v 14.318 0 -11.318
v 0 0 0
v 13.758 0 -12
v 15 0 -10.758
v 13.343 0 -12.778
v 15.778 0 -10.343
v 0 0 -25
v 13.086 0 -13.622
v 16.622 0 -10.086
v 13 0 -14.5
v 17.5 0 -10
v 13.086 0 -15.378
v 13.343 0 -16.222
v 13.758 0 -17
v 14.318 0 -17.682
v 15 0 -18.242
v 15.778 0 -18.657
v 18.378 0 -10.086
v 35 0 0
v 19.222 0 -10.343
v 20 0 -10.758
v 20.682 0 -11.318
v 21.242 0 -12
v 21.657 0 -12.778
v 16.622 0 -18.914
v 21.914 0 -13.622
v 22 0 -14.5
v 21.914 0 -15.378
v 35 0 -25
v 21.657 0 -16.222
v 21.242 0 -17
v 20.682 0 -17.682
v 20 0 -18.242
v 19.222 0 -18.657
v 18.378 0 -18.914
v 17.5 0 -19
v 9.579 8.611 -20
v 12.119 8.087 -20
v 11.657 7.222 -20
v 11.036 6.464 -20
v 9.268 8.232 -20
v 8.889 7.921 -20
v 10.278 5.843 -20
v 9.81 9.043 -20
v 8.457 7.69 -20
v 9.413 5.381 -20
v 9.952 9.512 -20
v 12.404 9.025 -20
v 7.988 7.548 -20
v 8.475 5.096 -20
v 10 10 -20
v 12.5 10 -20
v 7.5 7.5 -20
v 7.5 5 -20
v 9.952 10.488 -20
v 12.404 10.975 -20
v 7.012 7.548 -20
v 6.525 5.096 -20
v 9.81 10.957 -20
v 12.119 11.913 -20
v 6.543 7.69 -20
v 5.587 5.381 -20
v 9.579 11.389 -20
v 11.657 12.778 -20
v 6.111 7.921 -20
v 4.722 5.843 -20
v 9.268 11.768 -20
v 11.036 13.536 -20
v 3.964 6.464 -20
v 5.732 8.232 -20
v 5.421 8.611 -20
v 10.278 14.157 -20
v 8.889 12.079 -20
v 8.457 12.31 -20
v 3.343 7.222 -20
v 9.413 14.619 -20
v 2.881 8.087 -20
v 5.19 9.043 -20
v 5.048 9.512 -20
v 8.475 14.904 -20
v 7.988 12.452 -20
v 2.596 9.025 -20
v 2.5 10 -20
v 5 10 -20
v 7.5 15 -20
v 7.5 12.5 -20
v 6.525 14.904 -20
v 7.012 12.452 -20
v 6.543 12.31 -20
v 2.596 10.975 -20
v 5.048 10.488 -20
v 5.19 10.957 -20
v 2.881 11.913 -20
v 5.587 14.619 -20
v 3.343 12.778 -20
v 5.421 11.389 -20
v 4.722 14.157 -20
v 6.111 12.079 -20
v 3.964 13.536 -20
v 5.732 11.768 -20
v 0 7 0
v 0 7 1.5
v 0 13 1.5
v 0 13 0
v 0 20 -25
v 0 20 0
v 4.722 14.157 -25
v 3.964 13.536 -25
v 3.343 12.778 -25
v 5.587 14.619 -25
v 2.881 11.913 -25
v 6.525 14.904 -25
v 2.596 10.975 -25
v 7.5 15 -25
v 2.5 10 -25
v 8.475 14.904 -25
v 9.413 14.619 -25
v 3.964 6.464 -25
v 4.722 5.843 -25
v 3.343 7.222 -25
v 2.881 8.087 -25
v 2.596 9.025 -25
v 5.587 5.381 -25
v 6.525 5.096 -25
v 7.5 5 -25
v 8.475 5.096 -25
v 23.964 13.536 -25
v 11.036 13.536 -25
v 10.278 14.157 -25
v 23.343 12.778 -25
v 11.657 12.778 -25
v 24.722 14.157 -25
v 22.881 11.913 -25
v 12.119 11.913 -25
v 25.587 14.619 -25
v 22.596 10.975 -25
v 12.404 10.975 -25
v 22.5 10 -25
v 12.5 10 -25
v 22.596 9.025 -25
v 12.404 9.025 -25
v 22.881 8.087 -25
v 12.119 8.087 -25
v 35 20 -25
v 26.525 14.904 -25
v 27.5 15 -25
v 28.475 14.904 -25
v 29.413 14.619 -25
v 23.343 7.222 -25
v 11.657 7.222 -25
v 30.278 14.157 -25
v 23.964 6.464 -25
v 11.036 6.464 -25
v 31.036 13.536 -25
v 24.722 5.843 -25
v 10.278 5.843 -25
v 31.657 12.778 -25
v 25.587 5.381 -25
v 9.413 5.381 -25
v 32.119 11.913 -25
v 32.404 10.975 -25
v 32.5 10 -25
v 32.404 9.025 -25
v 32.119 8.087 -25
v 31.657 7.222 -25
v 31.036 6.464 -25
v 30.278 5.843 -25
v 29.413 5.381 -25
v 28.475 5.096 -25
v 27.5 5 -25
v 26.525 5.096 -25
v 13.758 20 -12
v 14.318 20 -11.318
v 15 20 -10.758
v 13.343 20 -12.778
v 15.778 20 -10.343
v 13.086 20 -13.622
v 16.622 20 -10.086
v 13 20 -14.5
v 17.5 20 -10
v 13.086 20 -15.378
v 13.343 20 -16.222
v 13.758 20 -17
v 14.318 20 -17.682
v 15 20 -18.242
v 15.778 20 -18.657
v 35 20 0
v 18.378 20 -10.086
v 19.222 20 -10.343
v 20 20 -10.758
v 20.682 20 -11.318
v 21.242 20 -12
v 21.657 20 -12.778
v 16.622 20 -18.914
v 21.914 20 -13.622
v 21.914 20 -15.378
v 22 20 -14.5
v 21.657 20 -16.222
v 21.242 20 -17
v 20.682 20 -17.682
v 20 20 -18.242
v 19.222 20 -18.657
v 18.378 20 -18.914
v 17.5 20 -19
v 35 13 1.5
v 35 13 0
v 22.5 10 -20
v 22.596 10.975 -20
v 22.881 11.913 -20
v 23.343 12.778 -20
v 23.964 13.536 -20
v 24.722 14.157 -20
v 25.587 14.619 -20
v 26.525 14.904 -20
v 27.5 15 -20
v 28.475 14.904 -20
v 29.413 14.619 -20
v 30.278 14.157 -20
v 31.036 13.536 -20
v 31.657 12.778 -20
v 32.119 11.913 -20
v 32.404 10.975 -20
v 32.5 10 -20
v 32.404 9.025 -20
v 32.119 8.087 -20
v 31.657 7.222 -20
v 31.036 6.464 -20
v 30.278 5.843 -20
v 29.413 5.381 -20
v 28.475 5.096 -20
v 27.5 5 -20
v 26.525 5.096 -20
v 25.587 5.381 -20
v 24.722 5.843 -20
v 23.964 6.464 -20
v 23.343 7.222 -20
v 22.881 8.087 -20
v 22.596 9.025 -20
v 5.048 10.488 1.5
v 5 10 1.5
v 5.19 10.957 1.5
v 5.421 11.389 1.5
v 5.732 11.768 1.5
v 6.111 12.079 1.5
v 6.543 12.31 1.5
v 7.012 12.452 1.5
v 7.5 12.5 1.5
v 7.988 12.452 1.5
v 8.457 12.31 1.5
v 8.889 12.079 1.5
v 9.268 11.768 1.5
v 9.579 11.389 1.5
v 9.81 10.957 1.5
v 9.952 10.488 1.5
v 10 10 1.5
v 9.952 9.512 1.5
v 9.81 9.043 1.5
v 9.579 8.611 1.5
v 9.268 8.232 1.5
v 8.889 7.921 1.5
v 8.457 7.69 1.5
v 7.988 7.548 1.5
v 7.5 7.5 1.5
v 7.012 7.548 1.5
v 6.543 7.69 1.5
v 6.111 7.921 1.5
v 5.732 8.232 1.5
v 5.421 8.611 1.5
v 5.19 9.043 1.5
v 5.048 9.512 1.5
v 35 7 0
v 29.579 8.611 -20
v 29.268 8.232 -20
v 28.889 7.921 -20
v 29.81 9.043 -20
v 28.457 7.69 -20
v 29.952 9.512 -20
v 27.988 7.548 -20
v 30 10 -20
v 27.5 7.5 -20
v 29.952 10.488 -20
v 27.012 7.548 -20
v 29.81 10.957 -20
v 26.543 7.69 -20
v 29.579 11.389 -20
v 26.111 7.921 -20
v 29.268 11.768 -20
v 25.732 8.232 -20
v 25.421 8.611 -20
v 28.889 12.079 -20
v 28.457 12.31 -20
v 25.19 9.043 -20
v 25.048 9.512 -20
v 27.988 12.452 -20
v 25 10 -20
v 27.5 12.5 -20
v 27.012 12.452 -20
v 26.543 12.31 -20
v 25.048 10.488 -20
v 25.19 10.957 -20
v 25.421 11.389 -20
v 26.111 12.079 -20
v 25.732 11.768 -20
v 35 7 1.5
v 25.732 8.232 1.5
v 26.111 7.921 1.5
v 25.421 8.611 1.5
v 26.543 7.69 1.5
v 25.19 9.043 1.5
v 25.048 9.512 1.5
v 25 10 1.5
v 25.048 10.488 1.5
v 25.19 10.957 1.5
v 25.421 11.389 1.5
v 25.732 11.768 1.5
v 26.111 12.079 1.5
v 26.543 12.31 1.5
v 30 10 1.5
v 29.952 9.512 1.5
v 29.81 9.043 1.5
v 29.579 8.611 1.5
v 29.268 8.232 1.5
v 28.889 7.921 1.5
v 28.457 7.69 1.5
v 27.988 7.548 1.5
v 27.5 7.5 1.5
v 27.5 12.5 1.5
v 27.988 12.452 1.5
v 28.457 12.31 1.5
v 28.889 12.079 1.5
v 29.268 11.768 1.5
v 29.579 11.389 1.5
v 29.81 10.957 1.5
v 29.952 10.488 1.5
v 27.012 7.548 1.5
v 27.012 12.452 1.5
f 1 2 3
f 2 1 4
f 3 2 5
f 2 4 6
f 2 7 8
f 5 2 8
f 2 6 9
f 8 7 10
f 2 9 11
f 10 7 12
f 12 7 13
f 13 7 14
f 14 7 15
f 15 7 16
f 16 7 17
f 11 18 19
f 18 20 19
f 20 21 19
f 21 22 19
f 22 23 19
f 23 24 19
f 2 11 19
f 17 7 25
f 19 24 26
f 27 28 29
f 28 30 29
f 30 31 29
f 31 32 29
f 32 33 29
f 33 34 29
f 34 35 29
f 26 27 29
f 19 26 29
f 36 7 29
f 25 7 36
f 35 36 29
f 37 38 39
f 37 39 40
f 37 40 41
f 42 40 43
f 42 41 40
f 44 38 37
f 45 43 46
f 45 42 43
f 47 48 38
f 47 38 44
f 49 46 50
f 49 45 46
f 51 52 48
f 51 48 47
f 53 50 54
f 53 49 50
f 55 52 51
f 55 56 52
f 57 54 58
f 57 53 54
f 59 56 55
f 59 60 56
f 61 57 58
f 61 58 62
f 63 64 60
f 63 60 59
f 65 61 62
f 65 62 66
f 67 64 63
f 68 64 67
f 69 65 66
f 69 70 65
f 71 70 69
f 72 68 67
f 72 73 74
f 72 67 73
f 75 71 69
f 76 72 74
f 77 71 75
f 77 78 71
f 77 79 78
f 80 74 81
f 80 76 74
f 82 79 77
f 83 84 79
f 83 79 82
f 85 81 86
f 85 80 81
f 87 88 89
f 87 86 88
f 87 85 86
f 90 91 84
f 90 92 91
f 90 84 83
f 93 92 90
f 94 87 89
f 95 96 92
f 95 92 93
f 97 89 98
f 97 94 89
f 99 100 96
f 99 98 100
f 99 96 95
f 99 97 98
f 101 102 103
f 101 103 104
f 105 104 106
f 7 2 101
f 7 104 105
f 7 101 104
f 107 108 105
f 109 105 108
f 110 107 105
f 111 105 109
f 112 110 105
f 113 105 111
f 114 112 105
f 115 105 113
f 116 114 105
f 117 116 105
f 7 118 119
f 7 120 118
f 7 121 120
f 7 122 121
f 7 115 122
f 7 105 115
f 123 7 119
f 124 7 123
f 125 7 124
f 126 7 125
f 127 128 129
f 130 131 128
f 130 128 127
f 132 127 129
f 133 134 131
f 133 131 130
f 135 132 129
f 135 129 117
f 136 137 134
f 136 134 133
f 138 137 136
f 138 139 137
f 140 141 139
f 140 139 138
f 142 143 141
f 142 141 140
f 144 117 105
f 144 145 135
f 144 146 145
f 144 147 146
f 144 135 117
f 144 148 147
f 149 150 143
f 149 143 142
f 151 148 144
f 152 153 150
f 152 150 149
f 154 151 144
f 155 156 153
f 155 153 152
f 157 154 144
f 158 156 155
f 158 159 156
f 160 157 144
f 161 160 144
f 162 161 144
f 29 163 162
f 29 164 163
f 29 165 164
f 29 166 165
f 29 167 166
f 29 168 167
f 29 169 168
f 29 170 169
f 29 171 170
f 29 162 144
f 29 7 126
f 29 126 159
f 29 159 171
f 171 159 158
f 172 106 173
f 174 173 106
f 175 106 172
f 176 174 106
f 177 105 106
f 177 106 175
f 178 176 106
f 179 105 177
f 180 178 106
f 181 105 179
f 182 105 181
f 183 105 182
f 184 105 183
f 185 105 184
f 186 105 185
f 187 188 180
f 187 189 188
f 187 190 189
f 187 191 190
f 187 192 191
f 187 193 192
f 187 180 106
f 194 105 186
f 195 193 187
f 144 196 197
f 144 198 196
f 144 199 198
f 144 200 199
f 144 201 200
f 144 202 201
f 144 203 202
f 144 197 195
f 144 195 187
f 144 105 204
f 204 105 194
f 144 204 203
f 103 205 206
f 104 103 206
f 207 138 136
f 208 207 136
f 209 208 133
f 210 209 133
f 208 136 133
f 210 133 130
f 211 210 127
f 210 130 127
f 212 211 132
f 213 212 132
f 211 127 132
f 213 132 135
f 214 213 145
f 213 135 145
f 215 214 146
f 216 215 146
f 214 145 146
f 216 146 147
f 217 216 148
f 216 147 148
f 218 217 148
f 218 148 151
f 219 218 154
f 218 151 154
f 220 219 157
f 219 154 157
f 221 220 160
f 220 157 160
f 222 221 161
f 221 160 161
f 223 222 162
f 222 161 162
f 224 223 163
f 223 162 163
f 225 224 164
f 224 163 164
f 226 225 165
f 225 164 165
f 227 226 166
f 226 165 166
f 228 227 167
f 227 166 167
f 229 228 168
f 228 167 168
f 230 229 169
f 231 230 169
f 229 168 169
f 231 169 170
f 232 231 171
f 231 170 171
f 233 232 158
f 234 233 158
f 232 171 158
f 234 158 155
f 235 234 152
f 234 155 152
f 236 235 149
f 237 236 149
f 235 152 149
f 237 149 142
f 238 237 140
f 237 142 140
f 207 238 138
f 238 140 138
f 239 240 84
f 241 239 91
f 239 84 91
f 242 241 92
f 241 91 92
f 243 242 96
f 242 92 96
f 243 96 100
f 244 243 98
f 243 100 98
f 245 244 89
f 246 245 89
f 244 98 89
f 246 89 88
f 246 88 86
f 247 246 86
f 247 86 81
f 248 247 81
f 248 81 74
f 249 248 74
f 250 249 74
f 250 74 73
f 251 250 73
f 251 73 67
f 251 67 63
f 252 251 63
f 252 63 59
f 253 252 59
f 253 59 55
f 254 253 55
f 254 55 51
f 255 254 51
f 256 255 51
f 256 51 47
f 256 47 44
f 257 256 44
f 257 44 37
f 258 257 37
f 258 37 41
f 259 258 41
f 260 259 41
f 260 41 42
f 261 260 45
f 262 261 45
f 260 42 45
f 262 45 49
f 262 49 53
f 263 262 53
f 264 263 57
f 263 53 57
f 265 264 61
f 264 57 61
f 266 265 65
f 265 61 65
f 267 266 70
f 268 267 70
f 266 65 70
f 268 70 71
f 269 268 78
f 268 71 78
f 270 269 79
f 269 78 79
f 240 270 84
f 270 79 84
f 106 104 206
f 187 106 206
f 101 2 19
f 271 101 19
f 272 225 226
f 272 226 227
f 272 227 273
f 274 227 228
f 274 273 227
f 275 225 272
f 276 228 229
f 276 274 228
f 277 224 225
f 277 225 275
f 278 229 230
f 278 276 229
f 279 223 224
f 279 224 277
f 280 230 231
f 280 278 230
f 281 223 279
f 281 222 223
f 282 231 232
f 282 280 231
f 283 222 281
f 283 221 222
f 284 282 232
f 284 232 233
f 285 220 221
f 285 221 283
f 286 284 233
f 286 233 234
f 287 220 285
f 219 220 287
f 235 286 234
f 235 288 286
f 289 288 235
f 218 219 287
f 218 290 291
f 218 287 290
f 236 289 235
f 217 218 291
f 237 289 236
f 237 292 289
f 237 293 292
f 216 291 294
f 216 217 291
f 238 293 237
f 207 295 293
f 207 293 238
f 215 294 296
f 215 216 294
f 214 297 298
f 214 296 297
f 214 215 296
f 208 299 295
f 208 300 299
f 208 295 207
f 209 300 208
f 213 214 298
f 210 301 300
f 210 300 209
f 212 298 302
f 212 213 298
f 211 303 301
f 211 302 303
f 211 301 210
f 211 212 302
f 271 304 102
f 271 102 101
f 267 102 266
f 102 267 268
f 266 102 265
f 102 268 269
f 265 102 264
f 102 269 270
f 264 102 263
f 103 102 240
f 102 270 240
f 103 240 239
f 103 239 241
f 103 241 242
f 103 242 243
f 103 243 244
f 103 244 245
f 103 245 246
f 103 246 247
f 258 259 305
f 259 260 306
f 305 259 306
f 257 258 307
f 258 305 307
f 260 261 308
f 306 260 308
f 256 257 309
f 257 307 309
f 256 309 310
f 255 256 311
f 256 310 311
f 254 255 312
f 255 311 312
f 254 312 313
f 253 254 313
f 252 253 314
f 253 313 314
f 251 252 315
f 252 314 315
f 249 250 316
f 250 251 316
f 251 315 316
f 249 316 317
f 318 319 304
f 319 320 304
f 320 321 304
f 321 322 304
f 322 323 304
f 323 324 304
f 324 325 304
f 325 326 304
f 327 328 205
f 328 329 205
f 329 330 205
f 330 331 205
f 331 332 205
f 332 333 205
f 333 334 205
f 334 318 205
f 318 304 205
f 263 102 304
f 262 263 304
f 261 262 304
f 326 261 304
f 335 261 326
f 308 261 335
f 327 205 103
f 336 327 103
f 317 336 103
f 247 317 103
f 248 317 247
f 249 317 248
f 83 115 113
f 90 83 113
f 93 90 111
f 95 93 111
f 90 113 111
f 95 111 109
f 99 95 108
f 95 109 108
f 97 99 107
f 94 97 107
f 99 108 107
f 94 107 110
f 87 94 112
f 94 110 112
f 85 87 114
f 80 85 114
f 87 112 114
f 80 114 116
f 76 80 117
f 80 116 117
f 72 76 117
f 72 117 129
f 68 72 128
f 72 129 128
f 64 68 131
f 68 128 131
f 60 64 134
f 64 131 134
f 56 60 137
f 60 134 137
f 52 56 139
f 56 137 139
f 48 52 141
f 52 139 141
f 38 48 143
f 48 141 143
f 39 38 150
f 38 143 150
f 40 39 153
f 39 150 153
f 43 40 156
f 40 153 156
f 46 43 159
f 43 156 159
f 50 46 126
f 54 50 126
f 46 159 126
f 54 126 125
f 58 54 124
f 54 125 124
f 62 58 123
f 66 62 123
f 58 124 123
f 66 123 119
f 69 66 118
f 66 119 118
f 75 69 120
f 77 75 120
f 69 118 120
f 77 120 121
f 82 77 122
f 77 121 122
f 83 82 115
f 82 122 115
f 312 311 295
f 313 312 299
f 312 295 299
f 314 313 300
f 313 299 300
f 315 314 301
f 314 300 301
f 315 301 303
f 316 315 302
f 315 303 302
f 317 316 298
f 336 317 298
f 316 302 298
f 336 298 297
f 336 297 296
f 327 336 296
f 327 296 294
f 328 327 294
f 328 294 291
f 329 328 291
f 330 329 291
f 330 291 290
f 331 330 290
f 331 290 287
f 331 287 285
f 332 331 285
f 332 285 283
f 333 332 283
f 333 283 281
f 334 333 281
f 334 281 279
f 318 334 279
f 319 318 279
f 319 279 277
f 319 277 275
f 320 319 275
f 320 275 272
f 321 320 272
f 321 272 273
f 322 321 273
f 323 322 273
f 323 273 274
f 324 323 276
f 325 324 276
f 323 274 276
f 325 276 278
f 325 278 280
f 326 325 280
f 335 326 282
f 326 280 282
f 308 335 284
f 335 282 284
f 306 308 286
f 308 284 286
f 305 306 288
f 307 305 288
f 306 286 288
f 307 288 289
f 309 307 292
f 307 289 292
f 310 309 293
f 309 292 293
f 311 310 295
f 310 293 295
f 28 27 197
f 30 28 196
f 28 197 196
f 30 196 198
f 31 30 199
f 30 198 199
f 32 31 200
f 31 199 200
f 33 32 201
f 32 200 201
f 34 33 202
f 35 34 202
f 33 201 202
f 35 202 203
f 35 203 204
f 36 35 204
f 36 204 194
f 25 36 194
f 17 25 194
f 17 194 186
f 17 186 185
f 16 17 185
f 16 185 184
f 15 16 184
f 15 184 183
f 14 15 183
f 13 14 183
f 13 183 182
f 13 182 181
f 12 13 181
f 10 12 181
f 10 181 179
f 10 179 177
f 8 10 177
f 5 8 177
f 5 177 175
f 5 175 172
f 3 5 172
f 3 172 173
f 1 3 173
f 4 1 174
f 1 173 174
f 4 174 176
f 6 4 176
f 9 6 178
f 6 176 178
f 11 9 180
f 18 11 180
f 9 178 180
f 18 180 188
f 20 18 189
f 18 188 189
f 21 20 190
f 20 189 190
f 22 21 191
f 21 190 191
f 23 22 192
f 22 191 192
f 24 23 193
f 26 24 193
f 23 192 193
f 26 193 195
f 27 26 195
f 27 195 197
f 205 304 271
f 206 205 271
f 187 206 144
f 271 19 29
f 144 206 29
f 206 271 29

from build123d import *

# Parameters (mm, degrees)
SKETCH1_W           = 35
SKETCH1_H           = 25
BOSS_EXTRUDE1_DEPTH = 20
SKETCH5_W           = 1.5
SKETCH5_H           = 6
BOSS_EXTRUDE2_DEPTH = 35
SKETCH2_R           = 4.5
CUT_EXTRUDE1_DEPTH  = 21
SKETCH3_R           = 2.5
CUT_EXTRUDE4_DEPTH  = 27.5
SKETCH4_R           = 5
SKETCH4_R_2         = 2.5
CUT_EXTRUDE5_DEPTH  = 5


with BuildPart() as part:
    # Sketch1 → Boss-Extrude1 (new body)
    with BuildSketch(Plane(origin=(0, 0, 0), x_dir=(1, 0, 0), z_dir=(0, 1, 0))):
        with Locations((17.5, 12.5)):
            Rectangle(SKETCH1_W, SKETCH1_H)
    extrude(amount=BOSS_EXTRUDE1_DEPTH)

    # Sketch5 → Boss-Extrude2 (add, through all)
    with BuildSketch(Plane(origin=(35, 0, 0), x_dir=(0, 0, -1), z_dir=(1, 0, 0))):
        with Locations((-0.75, 10)):
            Rectangle(SKETCH5_W, SKETCH5_H)
    extrude(amount=-BOSS_EXTRUDE2_DEPTH)

    # Sketch2 → Cut-Extrude1 (cut, through all)
    with BuildSketch(Plane(origin=(0, 20, 0), x_dir=(1, 0, 0), z_dir=(0, 1, 0))):
        with Locations((17.5, 14.5)):
            Circle(SKETCH2_R)
    extrude(amount=-CUT_EXTRUDE1_DEPTH, mode=Mode.SUBTRACT)

    # Sketch3 → Cut-Extrude4 (cut, through all)
    with BuildSketch(Plane(origin=(0, 0, -25), x_dir=(-1, 0, 0), z_dir=(0, 0, -1))):
        with Locations((-7.5, 10)):
            Circle(SKETCH3_R)
        with Locations((-27.5, 10)):
            Circle(SKETCH3_R)
    extrude(amount=-CUT_EXTRUDE4_DEPTH, mode=Mode.SUBTRACT)

    # Sketch4 → Cut-Extrude5 (cut)
    with BuildSketch(Plane(origin=(0, 0, -25), x_dir=(-1, 0, 0), z_dir=(0, 0, -1))):
        with Locations((-7.5, 10)):
            Circle(SKETCH4_R)
        with Locations((-7.5, 10)):
            Circle(SKETCH4_R_2, mode=Mode.SUBTRACT)
        with Locations((-27.5, 10)):
            Circle(SKETCH4_R)
        with Locations((-27.5, 10)):
            Circle(SKETCH4_R_2, mode=Mode.SUBTRACT)
    extrude(amount=-CUT_EXTRUDE5_DEPTH, mode=Mode.SUBTRACT)


solid = part.part
